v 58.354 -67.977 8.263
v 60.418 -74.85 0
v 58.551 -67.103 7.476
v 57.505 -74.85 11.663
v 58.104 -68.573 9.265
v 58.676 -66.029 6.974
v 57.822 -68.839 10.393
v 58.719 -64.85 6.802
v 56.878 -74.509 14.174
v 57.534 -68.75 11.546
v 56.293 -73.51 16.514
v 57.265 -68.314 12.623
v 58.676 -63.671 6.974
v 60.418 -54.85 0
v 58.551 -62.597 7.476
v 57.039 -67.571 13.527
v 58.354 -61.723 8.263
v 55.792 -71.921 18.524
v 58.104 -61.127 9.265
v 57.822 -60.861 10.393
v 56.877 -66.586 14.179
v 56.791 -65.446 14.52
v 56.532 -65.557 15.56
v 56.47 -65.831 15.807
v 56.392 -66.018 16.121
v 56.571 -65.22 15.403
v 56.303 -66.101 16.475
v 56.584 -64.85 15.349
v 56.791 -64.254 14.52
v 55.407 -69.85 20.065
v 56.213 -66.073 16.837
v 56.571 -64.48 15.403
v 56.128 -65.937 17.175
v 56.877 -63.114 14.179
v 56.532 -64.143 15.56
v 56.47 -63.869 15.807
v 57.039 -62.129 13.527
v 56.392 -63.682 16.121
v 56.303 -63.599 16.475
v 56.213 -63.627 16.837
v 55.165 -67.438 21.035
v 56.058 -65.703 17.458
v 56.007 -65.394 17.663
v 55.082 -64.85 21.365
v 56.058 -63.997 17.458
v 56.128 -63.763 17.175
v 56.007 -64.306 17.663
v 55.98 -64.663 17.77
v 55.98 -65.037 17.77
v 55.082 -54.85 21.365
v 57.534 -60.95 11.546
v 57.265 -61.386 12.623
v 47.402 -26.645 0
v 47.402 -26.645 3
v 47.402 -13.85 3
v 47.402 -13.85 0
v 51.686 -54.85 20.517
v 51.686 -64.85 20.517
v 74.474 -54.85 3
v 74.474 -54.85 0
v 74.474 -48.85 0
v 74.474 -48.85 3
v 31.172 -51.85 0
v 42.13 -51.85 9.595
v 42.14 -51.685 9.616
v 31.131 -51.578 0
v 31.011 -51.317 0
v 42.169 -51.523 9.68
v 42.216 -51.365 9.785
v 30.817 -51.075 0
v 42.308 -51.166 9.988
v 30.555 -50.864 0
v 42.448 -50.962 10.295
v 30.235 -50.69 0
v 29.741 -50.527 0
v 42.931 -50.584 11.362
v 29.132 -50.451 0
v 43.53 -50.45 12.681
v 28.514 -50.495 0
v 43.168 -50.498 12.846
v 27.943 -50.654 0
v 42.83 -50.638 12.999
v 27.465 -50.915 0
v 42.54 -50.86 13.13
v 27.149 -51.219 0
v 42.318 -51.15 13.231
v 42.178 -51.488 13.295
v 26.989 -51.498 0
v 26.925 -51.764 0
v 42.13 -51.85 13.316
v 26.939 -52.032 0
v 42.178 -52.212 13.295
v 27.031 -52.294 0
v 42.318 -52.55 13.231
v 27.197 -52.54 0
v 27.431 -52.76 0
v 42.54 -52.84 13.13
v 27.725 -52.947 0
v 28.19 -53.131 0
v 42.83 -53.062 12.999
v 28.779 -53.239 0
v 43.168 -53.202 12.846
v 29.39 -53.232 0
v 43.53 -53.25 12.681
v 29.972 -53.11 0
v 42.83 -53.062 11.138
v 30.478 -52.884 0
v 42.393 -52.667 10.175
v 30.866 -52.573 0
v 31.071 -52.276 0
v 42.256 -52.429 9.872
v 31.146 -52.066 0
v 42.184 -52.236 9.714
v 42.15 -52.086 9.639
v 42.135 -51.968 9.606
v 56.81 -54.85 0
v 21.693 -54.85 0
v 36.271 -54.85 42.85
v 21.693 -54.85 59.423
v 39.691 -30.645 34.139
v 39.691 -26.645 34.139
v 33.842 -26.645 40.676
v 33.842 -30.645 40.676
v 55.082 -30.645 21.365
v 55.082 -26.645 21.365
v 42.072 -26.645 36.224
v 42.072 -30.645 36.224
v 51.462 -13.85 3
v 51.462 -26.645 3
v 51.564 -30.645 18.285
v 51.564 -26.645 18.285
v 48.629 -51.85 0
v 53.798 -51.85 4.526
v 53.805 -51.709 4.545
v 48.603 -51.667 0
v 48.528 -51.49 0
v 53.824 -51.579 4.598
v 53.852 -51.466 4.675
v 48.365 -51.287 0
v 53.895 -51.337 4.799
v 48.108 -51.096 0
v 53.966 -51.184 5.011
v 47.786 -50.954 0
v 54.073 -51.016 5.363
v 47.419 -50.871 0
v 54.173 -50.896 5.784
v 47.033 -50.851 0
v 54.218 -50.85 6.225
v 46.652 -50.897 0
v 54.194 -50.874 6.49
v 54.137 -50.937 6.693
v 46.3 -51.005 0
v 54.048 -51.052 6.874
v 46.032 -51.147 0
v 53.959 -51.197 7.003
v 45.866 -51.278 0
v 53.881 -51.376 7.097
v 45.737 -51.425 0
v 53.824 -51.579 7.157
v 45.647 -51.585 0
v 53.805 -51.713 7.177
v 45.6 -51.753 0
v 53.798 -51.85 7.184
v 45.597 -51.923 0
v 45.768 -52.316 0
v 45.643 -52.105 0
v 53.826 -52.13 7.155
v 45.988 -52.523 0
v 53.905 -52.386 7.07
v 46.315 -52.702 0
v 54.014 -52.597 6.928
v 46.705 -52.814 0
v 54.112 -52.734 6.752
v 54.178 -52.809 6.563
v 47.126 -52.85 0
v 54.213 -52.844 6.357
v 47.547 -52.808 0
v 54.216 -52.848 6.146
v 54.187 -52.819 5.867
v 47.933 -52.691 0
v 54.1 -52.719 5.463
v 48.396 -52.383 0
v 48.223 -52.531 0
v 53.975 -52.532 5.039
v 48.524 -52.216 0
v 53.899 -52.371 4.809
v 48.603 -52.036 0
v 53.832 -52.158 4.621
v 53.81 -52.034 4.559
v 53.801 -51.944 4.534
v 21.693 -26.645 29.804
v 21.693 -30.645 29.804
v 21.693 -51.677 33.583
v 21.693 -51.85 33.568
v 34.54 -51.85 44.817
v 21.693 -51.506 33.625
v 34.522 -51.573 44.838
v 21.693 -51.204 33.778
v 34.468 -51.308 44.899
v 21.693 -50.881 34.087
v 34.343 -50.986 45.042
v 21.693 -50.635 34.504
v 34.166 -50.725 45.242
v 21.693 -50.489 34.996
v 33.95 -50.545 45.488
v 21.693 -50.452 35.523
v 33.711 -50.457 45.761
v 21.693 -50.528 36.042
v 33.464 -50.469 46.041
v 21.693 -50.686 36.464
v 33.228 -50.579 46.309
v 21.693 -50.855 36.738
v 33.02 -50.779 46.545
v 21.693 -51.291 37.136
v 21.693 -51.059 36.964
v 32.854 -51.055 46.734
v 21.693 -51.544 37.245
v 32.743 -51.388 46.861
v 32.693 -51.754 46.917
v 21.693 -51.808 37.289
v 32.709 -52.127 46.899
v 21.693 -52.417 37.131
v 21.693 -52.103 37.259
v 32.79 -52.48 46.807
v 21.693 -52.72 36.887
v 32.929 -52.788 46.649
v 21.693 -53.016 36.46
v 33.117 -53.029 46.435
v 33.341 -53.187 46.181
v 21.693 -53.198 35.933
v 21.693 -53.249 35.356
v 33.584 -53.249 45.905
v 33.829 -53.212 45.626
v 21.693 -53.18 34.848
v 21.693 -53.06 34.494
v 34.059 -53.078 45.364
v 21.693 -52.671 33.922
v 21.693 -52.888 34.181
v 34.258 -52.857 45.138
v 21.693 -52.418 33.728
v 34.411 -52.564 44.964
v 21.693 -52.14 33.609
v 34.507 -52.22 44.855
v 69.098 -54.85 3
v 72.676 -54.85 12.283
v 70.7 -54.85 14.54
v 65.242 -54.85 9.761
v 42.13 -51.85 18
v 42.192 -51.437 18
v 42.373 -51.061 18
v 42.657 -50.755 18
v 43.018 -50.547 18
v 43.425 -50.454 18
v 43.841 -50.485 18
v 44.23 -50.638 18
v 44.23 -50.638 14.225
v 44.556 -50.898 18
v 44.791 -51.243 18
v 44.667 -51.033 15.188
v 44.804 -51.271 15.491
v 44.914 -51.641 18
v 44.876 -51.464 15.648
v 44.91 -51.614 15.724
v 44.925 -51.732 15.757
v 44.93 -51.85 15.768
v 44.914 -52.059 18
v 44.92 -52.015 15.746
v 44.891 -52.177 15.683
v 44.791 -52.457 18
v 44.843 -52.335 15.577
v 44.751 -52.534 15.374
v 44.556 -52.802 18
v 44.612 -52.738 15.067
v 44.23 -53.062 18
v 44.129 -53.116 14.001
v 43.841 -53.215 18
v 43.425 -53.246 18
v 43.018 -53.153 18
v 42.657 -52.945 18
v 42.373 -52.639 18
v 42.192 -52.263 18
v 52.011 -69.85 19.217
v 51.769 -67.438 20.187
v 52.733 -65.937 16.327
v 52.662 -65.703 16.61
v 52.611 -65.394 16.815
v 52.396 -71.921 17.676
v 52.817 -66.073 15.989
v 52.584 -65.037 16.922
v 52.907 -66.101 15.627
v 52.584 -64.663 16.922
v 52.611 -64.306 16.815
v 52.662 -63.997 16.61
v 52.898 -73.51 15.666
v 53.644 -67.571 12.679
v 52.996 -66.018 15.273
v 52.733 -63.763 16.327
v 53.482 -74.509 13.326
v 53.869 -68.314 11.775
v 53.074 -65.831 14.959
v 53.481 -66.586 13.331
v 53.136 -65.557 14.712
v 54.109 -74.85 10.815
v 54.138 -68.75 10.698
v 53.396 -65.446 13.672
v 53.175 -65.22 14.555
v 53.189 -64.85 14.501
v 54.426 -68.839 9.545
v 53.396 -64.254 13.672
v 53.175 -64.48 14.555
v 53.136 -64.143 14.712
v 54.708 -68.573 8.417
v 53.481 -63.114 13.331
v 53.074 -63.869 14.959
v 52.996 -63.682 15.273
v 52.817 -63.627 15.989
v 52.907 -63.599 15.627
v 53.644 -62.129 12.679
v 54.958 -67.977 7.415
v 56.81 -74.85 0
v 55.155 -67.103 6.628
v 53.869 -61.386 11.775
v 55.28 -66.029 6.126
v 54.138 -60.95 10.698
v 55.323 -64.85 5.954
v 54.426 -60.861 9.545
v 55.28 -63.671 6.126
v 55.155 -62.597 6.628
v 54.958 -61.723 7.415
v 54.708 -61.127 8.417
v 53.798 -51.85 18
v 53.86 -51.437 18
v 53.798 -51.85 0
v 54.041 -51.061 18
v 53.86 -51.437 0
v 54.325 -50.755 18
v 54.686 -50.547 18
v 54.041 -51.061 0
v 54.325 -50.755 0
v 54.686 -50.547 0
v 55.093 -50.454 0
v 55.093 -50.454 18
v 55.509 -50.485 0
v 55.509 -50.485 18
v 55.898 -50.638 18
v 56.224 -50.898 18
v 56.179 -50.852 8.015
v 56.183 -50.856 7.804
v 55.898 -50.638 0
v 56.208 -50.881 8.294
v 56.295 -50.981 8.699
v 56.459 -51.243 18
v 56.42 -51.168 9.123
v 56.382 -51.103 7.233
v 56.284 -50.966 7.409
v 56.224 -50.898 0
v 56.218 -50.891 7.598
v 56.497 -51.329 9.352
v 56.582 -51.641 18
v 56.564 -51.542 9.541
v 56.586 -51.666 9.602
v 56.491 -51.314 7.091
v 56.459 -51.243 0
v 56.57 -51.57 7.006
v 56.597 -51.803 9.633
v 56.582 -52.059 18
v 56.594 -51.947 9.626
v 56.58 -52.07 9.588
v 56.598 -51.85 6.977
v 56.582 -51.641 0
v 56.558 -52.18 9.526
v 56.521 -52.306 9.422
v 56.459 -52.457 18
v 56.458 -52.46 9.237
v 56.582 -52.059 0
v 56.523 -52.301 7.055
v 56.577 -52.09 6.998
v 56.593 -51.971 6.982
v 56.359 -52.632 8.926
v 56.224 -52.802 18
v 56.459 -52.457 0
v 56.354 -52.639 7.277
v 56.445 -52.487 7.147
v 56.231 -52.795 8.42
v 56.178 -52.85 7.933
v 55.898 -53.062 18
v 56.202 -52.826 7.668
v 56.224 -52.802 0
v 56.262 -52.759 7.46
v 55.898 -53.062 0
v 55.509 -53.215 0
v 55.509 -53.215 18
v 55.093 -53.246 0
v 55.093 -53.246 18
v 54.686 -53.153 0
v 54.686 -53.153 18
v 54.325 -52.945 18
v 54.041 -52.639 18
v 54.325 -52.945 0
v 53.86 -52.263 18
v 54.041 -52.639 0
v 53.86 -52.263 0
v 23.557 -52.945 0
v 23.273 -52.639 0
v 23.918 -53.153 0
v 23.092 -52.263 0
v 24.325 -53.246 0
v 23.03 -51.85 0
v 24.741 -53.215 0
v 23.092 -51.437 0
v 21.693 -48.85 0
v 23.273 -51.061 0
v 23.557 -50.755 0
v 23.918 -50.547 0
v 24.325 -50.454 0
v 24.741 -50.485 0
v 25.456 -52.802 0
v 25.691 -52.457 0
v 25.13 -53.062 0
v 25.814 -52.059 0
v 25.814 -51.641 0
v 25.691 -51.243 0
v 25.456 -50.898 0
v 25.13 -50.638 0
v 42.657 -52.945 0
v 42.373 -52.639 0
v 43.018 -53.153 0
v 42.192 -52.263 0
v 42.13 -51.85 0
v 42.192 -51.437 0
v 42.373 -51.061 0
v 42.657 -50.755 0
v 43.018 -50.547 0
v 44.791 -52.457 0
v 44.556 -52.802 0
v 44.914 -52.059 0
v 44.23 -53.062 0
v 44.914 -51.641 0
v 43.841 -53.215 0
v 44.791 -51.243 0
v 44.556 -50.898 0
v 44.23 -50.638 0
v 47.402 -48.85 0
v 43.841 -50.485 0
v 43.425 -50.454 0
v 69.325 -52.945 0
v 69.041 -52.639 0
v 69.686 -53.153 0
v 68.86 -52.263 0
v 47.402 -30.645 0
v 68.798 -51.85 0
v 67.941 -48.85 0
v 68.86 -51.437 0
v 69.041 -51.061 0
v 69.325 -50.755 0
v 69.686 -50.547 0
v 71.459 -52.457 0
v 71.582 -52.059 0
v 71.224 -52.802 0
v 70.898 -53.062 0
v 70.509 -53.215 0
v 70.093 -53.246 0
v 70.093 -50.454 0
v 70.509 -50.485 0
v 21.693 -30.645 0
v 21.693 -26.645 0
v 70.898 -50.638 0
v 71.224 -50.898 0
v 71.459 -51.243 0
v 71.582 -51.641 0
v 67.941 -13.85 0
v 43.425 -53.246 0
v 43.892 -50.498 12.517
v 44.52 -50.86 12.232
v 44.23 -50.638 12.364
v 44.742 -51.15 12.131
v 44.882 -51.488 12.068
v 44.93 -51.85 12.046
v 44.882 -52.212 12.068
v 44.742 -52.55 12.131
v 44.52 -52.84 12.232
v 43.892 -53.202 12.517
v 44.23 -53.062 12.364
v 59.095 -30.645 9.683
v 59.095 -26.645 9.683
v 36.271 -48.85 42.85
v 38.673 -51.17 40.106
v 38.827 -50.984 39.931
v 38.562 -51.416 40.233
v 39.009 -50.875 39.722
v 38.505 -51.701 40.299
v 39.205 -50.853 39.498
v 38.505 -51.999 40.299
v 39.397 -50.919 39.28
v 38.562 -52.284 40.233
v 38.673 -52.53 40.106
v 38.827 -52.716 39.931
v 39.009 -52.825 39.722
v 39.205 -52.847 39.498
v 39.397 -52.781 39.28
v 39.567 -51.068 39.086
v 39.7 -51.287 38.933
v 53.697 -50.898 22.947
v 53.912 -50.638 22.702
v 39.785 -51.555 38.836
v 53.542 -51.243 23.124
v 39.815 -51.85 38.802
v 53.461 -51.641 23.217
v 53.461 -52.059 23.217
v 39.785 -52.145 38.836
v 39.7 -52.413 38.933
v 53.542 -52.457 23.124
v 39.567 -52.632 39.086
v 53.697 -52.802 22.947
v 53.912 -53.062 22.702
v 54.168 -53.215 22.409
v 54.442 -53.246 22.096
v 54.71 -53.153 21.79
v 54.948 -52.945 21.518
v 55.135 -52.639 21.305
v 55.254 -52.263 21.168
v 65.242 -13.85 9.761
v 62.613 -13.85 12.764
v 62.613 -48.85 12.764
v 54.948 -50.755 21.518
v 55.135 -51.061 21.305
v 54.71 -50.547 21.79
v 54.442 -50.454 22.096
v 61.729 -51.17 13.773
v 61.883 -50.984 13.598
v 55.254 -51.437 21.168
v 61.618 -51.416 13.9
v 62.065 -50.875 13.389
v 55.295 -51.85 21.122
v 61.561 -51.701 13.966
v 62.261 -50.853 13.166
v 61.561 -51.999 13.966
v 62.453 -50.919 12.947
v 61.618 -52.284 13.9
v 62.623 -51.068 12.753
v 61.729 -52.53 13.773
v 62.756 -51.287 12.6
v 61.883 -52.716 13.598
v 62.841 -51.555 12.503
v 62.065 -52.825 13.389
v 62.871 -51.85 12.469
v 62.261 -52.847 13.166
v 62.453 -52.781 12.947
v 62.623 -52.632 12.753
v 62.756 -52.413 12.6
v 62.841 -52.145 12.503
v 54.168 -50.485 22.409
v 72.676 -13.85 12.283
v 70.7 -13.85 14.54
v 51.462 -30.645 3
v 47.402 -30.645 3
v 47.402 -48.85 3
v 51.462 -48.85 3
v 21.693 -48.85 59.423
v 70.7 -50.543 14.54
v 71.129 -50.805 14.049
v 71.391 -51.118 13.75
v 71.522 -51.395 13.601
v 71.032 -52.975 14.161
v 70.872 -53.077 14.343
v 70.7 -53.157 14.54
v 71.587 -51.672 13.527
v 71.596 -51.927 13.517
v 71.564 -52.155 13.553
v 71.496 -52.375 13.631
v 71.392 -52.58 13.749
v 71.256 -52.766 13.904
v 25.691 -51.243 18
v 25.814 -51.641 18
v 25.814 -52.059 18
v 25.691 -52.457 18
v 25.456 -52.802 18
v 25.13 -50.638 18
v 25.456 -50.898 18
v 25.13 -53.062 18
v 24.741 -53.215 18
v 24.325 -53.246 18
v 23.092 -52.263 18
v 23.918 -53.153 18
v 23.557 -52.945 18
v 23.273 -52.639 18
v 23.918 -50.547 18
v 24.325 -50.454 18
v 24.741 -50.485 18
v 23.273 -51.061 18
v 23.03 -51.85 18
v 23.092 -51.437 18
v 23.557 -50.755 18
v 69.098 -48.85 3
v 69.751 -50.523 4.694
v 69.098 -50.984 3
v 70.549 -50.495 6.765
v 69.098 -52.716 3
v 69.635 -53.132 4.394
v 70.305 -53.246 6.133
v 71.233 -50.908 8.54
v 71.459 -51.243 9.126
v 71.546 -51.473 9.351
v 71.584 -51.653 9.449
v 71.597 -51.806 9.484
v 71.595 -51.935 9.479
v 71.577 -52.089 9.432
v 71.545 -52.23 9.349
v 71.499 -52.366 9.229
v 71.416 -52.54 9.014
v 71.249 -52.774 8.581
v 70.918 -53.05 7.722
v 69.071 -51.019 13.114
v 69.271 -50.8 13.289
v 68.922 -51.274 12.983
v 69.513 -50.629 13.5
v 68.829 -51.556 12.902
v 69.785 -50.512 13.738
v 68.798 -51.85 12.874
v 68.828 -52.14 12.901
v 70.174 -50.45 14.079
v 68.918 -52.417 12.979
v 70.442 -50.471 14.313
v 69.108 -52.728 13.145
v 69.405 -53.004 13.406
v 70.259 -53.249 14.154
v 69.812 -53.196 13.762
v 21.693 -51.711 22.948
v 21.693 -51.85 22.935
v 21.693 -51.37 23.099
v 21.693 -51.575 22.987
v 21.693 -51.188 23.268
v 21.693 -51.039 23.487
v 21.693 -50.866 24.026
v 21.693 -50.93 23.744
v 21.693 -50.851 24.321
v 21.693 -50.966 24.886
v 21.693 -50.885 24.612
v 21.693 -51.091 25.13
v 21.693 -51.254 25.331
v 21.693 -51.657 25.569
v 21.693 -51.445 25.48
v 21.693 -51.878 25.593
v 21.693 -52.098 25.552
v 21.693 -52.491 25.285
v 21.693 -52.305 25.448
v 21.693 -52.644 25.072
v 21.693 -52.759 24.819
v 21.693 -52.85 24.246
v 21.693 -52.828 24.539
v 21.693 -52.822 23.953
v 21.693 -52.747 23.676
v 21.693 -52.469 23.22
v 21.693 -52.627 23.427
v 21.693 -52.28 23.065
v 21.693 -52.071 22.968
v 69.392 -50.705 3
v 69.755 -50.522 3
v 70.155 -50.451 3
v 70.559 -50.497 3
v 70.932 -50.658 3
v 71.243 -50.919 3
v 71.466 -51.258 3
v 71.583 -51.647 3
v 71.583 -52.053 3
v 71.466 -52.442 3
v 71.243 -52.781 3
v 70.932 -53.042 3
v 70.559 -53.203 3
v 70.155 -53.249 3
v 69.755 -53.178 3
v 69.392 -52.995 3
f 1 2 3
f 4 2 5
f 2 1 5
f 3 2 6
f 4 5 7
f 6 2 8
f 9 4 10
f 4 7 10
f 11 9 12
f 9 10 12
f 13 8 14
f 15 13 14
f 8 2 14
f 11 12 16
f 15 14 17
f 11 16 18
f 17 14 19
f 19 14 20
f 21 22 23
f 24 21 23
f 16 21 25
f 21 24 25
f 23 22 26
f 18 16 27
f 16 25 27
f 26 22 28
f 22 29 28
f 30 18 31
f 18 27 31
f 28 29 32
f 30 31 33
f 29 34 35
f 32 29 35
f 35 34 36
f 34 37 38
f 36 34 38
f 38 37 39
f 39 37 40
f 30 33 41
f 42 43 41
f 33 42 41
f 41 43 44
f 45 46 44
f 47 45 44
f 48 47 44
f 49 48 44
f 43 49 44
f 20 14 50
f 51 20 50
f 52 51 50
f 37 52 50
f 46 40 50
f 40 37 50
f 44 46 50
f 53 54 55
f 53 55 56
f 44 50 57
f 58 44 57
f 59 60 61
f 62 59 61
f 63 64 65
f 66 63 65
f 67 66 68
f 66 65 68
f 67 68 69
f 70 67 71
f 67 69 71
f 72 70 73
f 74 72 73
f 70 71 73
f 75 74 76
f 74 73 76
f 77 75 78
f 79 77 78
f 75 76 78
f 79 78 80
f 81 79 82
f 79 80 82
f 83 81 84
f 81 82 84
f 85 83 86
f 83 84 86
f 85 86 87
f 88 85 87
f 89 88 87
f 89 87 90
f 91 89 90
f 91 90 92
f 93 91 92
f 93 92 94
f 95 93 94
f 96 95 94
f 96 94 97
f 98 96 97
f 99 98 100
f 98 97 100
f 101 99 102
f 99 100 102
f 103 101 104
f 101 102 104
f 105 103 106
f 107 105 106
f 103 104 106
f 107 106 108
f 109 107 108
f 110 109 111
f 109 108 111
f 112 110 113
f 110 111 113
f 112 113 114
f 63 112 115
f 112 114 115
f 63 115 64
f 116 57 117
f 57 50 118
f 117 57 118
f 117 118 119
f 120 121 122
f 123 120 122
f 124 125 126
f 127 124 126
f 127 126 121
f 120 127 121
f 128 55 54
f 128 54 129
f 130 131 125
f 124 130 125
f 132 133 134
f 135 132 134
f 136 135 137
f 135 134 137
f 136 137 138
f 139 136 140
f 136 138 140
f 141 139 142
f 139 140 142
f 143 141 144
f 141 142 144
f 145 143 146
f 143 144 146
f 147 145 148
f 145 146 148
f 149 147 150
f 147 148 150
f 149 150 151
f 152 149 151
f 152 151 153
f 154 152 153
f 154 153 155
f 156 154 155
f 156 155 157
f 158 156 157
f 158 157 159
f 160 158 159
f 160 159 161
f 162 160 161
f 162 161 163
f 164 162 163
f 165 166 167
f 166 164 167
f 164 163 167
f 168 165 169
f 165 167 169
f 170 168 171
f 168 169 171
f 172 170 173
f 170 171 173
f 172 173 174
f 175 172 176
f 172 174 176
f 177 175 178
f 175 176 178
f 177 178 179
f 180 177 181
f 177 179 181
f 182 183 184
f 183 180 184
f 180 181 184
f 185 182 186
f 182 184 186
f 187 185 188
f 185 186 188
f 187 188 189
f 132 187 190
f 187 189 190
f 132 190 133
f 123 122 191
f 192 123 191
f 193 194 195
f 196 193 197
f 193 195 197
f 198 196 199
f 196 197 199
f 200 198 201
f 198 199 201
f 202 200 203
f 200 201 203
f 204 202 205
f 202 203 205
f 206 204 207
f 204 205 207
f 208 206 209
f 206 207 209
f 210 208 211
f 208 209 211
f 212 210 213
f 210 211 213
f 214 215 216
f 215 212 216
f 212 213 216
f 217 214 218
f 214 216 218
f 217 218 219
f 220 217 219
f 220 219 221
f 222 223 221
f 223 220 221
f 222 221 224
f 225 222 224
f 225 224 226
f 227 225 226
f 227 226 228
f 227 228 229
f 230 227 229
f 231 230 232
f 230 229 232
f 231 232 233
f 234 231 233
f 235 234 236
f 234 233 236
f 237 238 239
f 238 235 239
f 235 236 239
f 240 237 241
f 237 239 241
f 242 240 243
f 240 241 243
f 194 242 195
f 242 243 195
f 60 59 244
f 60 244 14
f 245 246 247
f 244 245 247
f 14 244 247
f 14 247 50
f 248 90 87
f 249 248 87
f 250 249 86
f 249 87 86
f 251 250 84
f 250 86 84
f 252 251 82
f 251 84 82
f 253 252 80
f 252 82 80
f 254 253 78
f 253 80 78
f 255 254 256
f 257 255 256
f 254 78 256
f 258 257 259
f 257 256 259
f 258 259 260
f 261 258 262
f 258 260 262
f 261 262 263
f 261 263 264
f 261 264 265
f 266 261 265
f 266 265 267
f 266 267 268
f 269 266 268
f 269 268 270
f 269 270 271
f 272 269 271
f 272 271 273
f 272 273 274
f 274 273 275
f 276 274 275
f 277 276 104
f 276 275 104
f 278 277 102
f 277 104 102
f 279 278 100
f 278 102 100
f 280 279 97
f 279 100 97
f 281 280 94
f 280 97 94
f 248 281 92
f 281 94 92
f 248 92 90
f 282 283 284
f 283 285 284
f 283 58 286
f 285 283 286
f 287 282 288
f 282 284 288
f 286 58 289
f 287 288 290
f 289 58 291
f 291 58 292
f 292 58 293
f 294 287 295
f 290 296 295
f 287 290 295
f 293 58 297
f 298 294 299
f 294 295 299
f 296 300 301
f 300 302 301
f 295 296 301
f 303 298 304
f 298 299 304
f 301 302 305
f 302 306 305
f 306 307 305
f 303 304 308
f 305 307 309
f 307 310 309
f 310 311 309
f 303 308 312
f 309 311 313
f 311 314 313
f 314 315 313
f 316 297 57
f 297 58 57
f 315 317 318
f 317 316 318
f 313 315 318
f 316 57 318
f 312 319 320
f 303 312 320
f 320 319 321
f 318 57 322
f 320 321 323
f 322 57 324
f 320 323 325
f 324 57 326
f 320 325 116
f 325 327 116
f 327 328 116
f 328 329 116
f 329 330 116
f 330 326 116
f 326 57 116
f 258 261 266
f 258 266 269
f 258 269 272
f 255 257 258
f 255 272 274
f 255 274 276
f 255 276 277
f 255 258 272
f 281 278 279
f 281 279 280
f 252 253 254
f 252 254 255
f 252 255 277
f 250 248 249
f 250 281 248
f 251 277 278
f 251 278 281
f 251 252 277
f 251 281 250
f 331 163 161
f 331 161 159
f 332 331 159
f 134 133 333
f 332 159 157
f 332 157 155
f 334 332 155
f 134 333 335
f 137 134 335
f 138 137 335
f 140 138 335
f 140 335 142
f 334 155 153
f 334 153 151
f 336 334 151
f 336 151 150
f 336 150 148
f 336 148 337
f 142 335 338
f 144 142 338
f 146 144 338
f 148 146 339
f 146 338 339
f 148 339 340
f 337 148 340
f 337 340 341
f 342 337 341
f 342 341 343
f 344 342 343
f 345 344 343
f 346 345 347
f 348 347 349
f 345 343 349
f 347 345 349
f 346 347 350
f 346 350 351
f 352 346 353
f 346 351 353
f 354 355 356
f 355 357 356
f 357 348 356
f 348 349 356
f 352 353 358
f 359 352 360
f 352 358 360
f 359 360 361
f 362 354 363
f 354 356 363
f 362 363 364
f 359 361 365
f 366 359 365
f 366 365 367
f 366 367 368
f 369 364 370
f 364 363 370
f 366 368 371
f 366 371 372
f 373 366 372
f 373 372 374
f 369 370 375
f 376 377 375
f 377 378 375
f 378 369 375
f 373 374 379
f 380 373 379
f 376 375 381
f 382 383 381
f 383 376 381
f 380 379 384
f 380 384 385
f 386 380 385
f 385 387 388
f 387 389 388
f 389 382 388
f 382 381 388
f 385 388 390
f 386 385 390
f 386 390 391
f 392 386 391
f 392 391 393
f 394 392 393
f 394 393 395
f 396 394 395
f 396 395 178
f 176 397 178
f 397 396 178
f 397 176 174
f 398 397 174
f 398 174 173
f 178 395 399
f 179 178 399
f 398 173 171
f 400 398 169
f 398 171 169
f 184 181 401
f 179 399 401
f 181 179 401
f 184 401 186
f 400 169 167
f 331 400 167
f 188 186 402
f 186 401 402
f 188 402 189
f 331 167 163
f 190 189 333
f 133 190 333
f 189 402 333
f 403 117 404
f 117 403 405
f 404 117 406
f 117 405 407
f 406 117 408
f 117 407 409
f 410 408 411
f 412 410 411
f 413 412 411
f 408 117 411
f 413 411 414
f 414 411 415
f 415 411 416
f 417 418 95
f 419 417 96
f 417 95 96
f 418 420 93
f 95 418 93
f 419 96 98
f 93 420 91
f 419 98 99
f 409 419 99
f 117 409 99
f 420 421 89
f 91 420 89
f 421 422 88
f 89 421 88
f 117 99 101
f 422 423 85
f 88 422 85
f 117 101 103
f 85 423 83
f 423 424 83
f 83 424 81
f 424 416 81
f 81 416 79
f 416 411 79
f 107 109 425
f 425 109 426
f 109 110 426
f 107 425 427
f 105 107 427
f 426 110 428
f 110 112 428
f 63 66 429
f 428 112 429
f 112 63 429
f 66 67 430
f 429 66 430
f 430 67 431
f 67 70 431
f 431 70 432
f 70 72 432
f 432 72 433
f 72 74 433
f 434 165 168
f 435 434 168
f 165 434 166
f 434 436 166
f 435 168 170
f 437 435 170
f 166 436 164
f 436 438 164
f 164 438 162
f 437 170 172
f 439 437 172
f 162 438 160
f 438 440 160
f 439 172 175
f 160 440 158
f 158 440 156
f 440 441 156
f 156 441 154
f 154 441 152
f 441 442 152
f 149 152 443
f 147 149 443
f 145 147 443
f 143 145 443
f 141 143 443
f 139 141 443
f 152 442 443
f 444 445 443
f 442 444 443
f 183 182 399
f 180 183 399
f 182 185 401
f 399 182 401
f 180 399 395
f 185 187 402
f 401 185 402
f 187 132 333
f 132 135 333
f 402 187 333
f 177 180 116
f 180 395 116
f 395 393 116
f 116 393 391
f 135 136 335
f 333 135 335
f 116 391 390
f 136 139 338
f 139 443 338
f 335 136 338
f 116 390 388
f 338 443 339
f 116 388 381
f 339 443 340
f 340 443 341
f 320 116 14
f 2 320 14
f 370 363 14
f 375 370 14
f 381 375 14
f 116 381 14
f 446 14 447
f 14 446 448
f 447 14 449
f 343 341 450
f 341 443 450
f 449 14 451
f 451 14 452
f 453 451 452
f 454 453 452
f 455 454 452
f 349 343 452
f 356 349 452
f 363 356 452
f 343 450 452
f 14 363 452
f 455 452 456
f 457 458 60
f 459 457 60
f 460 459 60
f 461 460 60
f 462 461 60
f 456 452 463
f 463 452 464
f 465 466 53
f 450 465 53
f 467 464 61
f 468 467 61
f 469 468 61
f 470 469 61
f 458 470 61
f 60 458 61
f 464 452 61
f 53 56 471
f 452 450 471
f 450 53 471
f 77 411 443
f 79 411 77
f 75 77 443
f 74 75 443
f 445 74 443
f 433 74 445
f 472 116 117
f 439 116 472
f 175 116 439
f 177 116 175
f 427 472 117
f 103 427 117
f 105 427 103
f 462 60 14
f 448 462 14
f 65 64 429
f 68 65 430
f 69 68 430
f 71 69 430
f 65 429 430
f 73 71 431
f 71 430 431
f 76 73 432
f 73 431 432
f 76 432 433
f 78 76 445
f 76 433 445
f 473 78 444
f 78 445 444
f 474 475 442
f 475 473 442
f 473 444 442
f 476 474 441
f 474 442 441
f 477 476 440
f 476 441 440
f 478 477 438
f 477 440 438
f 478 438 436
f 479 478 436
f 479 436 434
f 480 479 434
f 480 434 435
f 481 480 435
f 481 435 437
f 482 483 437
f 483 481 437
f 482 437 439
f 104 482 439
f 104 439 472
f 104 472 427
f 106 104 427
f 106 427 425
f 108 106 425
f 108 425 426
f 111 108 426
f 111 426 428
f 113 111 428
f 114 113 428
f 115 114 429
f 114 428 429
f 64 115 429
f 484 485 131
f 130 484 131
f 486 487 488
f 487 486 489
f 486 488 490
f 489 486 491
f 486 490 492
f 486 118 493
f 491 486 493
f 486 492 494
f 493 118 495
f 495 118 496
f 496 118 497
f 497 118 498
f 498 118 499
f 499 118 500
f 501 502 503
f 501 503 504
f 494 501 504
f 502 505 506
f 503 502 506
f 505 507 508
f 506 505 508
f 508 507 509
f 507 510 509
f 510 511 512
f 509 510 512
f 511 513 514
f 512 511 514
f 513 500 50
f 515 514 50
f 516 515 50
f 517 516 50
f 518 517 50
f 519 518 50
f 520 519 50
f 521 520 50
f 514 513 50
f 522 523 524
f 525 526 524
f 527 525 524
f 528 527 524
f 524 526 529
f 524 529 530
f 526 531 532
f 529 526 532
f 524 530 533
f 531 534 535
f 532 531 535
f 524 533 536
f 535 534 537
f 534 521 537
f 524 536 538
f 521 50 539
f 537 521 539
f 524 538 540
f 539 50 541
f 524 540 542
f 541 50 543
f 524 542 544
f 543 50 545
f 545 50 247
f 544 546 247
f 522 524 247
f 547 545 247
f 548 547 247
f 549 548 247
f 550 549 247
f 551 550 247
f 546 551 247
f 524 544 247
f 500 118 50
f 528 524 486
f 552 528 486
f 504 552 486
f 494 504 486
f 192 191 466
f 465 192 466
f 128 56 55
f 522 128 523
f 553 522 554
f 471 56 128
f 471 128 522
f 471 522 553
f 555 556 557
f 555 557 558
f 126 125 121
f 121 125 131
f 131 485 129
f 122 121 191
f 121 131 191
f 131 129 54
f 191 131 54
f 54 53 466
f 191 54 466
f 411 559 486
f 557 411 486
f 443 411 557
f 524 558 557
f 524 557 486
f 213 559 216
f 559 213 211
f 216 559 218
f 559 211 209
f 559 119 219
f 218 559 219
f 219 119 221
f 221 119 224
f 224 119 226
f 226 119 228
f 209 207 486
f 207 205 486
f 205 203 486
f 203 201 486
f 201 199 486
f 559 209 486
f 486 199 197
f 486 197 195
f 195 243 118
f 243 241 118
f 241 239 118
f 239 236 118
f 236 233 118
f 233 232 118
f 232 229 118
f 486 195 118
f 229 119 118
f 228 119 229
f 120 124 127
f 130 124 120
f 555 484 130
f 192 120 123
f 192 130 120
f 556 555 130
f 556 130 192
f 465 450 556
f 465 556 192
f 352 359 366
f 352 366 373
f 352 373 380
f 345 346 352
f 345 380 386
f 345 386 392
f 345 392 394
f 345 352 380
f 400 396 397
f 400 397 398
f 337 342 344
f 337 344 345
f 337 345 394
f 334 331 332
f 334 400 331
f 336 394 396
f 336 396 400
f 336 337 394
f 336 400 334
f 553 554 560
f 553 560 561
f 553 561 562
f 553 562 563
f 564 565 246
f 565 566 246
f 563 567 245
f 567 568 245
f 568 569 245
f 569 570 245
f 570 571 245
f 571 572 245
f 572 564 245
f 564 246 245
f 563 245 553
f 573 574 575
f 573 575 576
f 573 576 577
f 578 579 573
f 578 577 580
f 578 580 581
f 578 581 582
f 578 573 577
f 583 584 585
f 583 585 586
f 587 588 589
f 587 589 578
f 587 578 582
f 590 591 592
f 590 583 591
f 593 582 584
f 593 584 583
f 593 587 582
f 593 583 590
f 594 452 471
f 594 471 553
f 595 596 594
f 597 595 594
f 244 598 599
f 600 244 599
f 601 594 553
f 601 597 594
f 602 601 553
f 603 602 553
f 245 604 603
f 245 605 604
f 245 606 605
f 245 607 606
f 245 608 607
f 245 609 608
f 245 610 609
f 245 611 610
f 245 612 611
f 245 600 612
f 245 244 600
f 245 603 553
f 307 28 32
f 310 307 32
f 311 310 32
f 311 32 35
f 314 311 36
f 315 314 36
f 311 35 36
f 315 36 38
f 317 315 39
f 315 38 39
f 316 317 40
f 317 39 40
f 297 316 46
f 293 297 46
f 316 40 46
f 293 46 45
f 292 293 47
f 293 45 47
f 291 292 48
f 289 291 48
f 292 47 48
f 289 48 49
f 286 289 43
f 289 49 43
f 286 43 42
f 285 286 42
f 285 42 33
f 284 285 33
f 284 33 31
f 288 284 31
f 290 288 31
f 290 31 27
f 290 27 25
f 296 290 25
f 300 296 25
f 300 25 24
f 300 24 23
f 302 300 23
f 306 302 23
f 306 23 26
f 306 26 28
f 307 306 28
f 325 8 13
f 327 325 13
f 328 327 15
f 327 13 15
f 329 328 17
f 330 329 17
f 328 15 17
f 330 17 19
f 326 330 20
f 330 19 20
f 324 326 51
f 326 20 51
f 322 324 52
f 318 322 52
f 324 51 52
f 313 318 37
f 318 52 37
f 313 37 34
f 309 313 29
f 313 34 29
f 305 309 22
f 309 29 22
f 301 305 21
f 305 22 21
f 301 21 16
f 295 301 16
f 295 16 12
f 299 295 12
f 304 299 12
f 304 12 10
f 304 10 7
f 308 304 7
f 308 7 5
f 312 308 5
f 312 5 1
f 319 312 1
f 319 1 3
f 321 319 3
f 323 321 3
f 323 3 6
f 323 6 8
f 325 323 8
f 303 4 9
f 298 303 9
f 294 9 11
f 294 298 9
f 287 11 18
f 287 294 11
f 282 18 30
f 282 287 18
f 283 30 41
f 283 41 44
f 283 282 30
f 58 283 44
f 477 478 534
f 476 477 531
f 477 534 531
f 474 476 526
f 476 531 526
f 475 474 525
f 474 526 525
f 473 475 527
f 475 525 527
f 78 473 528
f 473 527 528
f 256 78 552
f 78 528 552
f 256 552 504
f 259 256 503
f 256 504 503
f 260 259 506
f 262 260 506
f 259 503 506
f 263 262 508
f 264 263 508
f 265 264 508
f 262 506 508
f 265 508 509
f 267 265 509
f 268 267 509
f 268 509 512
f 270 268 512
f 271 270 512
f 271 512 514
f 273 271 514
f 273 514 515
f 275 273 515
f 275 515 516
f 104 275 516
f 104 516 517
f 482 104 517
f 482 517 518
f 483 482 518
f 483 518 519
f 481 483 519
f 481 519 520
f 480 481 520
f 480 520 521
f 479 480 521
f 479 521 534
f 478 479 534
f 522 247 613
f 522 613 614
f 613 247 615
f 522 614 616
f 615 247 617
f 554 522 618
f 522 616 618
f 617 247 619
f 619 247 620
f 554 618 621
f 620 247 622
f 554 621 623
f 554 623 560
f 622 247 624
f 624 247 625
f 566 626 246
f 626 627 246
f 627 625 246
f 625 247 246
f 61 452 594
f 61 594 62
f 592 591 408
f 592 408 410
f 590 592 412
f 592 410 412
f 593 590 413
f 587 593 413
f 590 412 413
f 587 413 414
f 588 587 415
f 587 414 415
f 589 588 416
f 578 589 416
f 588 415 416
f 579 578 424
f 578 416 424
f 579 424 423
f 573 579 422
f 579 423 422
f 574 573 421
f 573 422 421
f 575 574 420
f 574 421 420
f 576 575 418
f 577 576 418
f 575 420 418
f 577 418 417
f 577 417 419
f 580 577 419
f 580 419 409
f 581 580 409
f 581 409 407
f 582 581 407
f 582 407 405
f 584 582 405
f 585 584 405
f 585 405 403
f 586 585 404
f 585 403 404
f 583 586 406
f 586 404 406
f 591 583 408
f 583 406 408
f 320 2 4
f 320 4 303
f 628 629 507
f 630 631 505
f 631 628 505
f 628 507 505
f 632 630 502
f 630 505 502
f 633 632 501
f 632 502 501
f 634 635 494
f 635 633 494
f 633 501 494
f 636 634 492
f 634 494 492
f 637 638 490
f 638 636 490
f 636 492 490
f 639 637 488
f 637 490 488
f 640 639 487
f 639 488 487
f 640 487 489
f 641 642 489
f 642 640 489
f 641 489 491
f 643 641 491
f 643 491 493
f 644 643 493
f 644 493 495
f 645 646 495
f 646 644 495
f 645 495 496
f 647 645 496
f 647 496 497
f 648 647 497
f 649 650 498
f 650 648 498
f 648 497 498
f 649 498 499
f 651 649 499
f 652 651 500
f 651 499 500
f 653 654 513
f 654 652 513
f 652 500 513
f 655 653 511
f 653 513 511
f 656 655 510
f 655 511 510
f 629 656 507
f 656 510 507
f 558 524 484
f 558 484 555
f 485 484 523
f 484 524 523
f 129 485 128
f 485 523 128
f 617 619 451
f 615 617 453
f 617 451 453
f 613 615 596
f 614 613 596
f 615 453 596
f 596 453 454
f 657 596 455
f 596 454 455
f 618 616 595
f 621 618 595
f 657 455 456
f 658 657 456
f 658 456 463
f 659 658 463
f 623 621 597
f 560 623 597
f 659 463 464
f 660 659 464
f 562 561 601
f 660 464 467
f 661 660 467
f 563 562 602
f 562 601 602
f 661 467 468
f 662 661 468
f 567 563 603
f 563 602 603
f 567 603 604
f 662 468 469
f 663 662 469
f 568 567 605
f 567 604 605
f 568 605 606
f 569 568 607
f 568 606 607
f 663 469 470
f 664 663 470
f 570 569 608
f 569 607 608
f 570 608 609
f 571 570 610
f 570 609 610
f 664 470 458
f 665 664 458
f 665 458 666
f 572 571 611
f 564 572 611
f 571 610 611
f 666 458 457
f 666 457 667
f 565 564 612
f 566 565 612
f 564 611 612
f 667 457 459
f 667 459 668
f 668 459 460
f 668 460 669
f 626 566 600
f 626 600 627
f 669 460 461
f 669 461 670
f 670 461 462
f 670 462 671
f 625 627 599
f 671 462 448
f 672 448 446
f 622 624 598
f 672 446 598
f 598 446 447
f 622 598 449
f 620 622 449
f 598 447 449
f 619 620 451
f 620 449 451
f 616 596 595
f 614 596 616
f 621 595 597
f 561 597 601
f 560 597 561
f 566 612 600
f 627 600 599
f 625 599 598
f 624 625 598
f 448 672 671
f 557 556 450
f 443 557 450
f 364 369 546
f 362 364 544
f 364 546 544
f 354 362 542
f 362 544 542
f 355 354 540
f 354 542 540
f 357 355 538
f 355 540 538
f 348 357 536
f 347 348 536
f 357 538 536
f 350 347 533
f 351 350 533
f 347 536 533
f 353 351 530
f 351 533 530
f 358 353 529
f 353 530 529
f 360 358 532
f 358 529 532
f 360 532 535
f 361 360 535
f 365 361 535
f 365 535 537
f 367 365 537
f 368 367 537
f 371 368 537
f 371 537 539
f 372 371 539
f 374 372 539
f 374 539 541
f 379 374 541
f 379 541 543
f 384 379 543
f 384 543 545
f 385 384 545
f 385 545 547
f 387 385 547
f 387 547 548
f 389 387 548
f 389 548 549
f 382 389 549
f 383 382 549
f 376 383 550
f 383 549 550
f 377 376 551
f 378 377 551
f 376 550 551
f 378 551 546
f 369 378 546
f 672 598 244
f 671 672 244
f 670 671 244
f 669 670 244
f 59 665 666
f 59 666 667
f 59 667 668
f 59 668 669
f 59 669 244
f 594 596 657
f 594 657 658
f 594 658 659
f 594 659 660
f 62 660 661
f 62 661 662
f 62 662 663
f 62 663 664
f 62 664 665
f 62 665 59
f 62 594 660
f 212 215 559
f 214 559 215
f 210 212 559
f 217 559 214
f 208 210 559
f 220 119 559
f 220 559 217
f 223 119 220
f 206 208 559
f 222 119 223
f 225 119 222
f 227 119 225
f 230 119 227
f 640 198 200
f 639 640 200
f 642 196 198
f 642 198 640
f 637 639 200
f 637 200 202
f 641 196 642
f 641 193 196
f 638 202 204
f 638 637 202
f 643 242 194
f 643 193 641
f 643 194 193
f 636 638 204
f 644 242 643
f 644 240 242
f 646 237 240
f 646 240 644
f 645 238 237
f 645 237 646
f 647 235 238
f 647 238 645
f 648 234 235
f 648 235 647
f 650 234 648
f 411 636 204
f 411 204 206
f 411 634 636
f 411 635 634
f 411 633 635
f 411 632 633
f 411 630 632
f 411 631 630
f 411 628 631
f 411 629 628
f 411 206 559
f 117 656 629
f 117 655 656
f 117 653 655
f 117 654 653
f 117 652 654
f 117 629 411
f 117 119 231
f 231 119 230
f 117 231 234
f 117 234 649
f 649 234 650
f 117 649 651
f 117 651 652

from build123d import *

# Parameters (mm, degrees)
ESQUISSE4_W             = 52.781616476
ESQUISSE4_H             = 6
BOSS_EXTRU_1_DEPTH      = 3
BOSS_EXTRU_2_DEPTH      = 41
ENL_V_MAT_EXTRU_1_DEPTH = 35
BOSS_EXTRU_3_DEPTH      = 4
ESQUISSE11_R            = 1.4
ENL_V_MAT_EXTRU_2_DEPTH = 43
BOSS_EXTRU_4_DEPTH      = 41
ESQUISSE15_R            = 1
ENL_V_MAT_EXTRU_4_DEPTH = 30
BOSS_EXTRU_5_DEPTH      = 20
ESQUISSE18_R            = 4
ENL_V_MAT_EXTRU_5_DEPTH = 12
ESQUISSE12_R            = 1.4
ENL_V_MAT_EXTRU_6_DEPTH = 18
ESQUISSE19_R            = 1.254640732
ENL_V_MAT_EXTRU_7_DEPTH = 18
CONG_1_R                = 10
ESQUISSE20_W            = 12.811790935
ESQUISSE20_H            = 3
BOSS_EXTRU_7_DEPTH      = 36


with BuildPart() as part:
    # Esquisse4 → Boss.-Extru.1 (new body)
    with BuildSketch(Plane.XY):
        with Locations((48.08341362, -51.85)):
            Rectangle(ESQUISSE4_W, ESQUISSE4_H)
    extrude(amount=BOSS_EXTRU_1_DEPTH)

    # Esquisse6 → Boss.-Extru.2 (add)
    with BuildSketch(Plane.XZ.offset(54.85)):
        Polygon((65.242227071, 9.760964304), (70.700086364, 14.539666718), (72.676320449, 12.282567065), (62.07450001, 3), (21.692605382, 3), (21.692605382, 29.804497378), (21.692605382, 59.423332345), (36.271065294, 42.849554228), align=None)
    extrude(amount=-BOSS_EXTRU_2_DEPTH)

    # Esquisse9 → Enlèv. mat.-Extru.1 (cut)
    with BuildSketch(Plane(origin=(0, -13.85, 0), x_dir=(1, 0, 0), z_dir=(0, 1, 0))):
        Polygon((36.271065294, -42.849554228), (62.613078874, -12.763771276), (51.461664708, -3), (21.692605382, -3), (21.692605382, -29.804497378), (21.692605382, -59.423332345), align=None)
    extrude(amount=-ENL_V_MAT_EXTRU_1_DEPTH, mode=Mode.SUBTRACT)

    # Esquisse10 → Boss.-Extru.3 (add)
    with BuildSketch(Plane(origin=(0, -26.644686639, 0), x_dir=(1, 0, 0), z_dir=(0, 1, 0))):
        Polygon((42.072152074, -36.224007657), (39.690998774, -34.139156727), (33.841851451, -40.675851871), (21.692605382, -29.804497378), (21.692605382, 0), (48.035299878, 0), (59.09491831, -9.68339828), (51.563800233, -18.28485098), (55.081960797, -21.365223976), align=None)
    extrude(amount=-BOSS_EXTRU_3_DEPTH)

    # Esquisse11 → Enlèv. mat.-Extru.2 (cut)
    with BuildSketch(Plane(origin=(41.768421189, 0, 36.570905264), x_dir=(0.658744695, 0, -0.752366551), z_dir=(0.752366551, 0, 0.658744695))):
        with Locations((19.134147904, -51.85)):
            Circle(ESQUISSE11_R)
        with Locations((-12.365852096, -51.85)):
            Circle(ESQUISSE11_R)
    extrude(amount=-ENL_V_MAT_EXTRU_2_DEPTH, mode=Mode.SUBTRACT)

    # Esquisse13 → Boss.-Extru.4 (add)
    with BuildSketch(Plane.XZ.offset(54.85)):
        Polygon((70.700086364, 14.539666718), (60.213373733, 5.357883848), (60.213373733, 0), (67.941059656, 0), (72.676320449, 12.282567065), align=None)
    extrude(amount=-BOSS_EXTRU_4_DEPTH)

    # Esquisse15 → Enlèv. mat.-Extru.4 (cut)
    with BuildSketch(Plane(origin=(41.768421189, 0, 36.570905264), x_dir=(0.658744695, 0, -0.752366551), z_dir=(0.752366551, 0, 0.658744695))):
        with Locations((31.034147904, -51.85)):
            Circle(ESQUISSE15_R)
        with Locations((-3.965852096, -51.85)):
            Circle(ESQUISSE15_R)
    extrude(amount=-ENL_V_MAT_EXTRU_4_DEPTH, mode=Mode.SUBTRACT)

    # Esquisse16 → Boss.-Extru.5 (add)
    with BuildSketch(Plane(origin=(0, -54.85, 0), x_dir=(1, 0, 0), z_dir=(0, 1, 0))):
        Polygon((60.41759692, 0), (55.081960797, -21.365223976), (51.686250118, -20.517197455), (56.810104658, 0), align=None)
    extrude(amount=-BOSS_EXTRU_5_DEPTH)

    # Esquisse18 → Enlèv. mat.-Extru.5 (cut)
    with BuildSketch(Plane(origin=(56.870719104, 0, 14.202587508), x_dir=(0.242293292, 0, -0.970203051), z_dir=(0.970203051, 0, 0.242293292))):
        with Locations((3.628081272, -64.85)):
            Circle(ESQUISSE18_R)
    extrude(amount=-ENL_V_MAT_EXTRU_5_DEPTH, mode=Mode.SUBTRACT)

    # Esquisse12 → Enlèv. mat.-Extru.6 (cut)
    with BuildSketch(Plane(origin=(0, 0, 0), x_dir=(-1, 0, 0), z_dir=(0, 0, -1))):
        with Locations((-24.42996151, -51.85)):
            Circle(ESQUISSE12_R)
        with Locations((-43.52996151, -51.85)):
            Circle(ESQUISSE12_R)
        with Locations((-55.197893581, -51.85)):
            Circle(ESQUISSE12_R)
        with Locations((-70.197893581, -51.85)):
            Circle(ESQUISSE12_R)
    extrude(amount=-ENL_V_MAT_EXTRU_6_DEPTH, mode=Mode.SUBTRACT)

    # Esquisse19 → Enlèv. mat.-Extru.7 (cut)
    with BuildSketch(Plane(origin=(56.870719104, 0, 14.202587508), x_dir=(0.242293292, 0, -0.970203051), z_dir=(0.970203051, 0, 0.242293292))):
        with Locations((-2.43609109, -64.85)):
            Circle(ESQUISSE19_R)
    extrude(amount=-ENL_V_MAT_EXTRU_7_DEPTH, mode=Mode.SUBTRACT)

    # Congé1
    cong_1_edges = [part.edges().sort_by_distance(p)[0] for p in [
        (53.384105458, -74.85, 20.941210715),
    ]]
    fillet(cong_1_edges, radius=CONG_1_R)

    # Esquisse20 → Boss.-Extru.7 (add)
    with BuildSketch(Plane(origin=(0, -13.85, 0), x_dir=(1, 0, 0), z_dir=(0, 1, 0))):
        with Locations((53.807478266, -1.5)):
            Rectangle(ESQUISSE20_W, ESQUISSE20_H)
    extrude(amount=-BOSS_EXTRU_7_DEPTH)


solid = part.part
